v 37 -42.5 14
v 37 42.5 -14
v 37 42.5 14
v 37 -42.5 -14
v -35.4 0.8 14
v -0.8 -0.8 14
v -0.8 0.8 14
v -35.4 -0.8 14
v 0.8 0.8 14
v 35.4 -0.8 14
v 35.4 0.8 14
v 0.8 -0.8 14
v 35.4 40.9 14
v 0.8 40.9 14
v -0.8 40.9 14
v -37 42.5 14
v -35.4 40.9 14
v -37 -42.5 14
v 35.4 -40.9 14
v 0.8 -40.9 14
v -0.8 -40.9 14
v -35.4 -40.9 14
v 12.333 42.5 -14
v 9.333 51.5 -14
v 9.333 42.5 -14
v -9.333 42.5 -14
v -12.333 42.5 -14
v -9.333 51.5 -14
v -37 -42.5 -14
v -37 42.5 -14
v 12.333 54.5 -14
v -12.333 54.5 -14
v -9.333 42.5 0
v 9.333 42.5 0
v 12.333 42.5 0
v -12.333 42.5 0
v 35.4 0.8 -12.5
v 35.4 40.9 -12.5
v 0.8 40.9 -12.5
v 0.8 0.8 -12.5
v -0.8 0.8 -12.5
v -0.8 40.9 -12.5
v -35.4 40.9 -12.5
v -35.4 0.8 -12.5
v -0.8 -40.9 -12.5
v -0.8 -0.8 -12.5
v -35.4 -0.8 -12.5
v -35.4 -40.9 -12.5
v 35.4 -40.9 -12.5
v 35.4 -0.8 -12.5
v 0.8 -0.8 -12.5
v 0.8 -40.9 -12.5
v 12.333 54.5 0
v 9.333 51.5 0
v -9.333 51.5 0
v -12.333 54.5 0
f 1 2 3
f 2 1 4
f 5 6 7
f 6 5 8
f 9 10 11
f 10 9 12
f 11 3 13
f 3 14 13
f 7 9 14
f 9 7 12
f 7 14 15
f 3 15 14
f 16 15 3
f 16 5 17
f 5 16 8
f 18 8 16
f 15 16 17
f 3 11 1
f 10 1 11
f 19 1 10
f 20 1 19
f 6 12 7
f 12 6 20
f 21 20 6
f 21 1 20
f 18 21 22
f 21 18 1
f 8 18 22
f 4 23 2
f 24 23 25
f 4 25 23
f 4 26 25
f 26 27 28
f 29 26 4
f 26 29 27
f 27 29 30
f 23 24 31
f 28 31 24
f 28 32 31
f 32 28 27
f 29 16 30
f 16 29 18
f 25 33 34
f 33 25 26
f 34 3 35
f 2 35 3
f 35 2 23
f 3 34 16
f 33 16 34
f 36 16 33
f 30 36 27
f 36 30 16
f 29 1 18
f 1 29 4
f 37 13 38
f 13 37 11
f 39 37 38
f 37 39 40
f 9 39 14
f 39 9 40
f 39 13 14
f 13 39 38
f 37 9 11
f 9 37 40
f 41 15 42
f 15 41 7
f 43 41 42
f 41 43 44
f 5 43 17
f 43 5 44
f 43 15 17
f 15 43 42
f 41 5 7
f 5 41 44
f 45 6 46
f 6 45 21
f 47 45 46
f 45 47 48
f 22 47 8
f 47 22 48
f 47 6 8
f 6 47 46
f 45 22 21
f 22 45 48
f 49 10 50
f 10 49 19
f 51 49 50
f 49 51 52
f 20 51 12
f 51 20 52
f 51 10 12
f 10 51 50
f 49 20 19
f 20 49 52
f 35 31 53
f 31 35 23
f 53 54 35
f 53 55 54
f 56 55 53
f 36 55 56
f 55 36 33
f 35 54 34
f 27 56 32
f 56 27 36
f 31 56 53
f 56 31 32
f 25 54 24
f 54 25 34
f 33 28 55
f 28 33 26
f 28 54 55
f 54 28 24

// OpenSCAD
//---------------------------------------------------------------
//-- Another compartment box, by Obijuan  (Juan Gonzalez-Gomez)
//-- (c) April, 2013
//---------------------------------------------------------------
//-- Released under the GPL license
//---------------------------------------------------------------
//-- It is a design derived from:
//--   http://www.thingiverse.com/thing:15802  by ttsalo
//---------------------------------------------------------------

X = 0;
Y = 1;
Z = 2;

//-- Drawer parameters
drawer_size = [74, 85, 28];
drawer_bottom_th = 1.5;
drawer_wall_th = 1.6;

//-- Cabinet parameters -------------------------------

//-- Rhombus parameters
alpha = 60;    //-- Rhombus Side angle
rx = 8;        //-- Rhombus x length

cab_size = [79, 100, 65];
cab_th = 2;


//-- Handle parameters
handle_size = [drawer_size[X]/3, 12, drawer_size[Z]/2];
handle_th = 3;

//---------------------------------
//-- A rhombus
//---------------------------------
module rhombus(ang=60, rx=20, h=3)
{

  x = rx/2;
  y = x*tan(ang);

  translate([0, 0, -h/2])
  linear_extrude(height=h)
  polygon([[-x,0], [0,y], [x,0], [0, -y]]);
}

//--------------------------------------
//-- A mosaic of rhombus
//-- INPUTS:
//--   L = x length of the area
//--   H = y length of the area
//--   rx: rhombus x length
//--   alpha: rhombus side angle
//--   rth: rhombus thickness
//--------------------------------------
module mosaic(L, H, rx, alpha, rth)
{

  //-- x distance between two adjacent rhombuses
  l = rx+6;

  //-- y distance between two rows of rhombuses
  h = l/2 * tan(alpha);

  //-- Calculate the number of rhombuses along the x and y axis
  nrx = round((L-l/2)/l);
  nry = round((H-h)/h);

  //-- Calculate the dimension of the mosaic, according to the
  //-- number of rhombuses (columns and rows)
  H2 = h * (nry-1);
  L2 = (nrx-1) * l + rx;

  //-- Draw the mosaic
  color("green")
  translate([-L2/2 + rx/2, -H2/2, 0])  //-- center the mosaic
  for (j=[0:nry-1]) {  //-- Rows...

    for (i=[0:nrx-1-(j%2)]) {  //-- Columns
      translate([i*l + (j%2)*l/2 ,j*h,0])
        rhombus(alpha,rx, rth);
    }
  }
}

module cabinet()
{
  inner = [cab_size[X] - 2*cab_th, cab_size[Y], cab_size[Z] - 2*cab_th];

  //-- rotation, for making it printable
  rotate([90,0,0])
  union() {
  difference() {

    //-- Main cabinet
    cube(cab_size, center= true);

    //-- Inner room
    translate([0, cab_th, 0])
    cube(inner, center=true);

    //-- Top and bottom mosaics
    mosaic(L = cab_size[X], 
           H = cab_size[Y], 
           rx = rx, 
           alpha = alpha, 
           rth = cab_size[Z]+10);

     //-- Left and right mosaics
     rotate([0, 90, 0])
       mosaic(L = cab_size[Z], 
              H = cab_size[Y], 
              rx = rx, 
              alpha = alpha, 
              rth = cab_size[X] + 10);

     //-- Rear cutout
     translate([0, -cab_size[Y]/2, 0])
       cube([cab_size[X]-30, 10, cab_size[Z]-30], center=true);
  }

  //-- side rails
  translate([10/2 - cab_size[X]/2, 0, 0])
    cube([10, cab_size[Y], cab_th], center=true);

  translate([-10/2 + cab_size[X]/2, 0, 0])
    cube([10, cab_size[Y], cab_th], center=true);
  }
}



module handle()
{
  extra = 2;
  handle_co_size = [handle_size[X]-2*handle_th, handle_size[Y], handle_size[Z] + extra ];

   translate([0, handle_size[Y]/2 + drawer_size[Y]/2 , -handle_size[Z]/2]) 
    difference() {
      cube(handle_size, center=true);
      translate([0, -handle_th, 0])
        cube(handle_co_size, center=true);
    }
}

module drawer_4x4()
{
  comp_4x4_size = [drawer_size[X]/2 - drawer_wall_th - drawer_wall_th/2,
                   drawer_size[Y]/2 - drawer_wall_th - drawer_wall_th/2,
                   drawer_size[Z] ];

  xc = drawer_wall_th/2 + comp_4x4_size[X]/2;
  yc = drawer_wall_th/2 + comp_4x4_size[Y]/2;

  difference() {
    cube(drawer_size, center = true);   

    translate([xc, yc, drawer_bottom_th])
      cube(comp_4x4_size, center=true);
    
    translate([-xc, yc, drawer_bottom_th])
      cube(comp_4x4_size, center=true);
    
    translate([-xc, -yc, drawer_bottom_th])
      cube(comp_4x4_size, center=true);  
    
    translate([xc, -yc, drawer_bottom_th])
      cube(comp_4x4_size, center=true);
  }

  handle();

}

module drawer_2x1()
{
  comp_2x1_size = [drawer_size[X]/2 - drawer_wall_th - drawer_wall_th/2,
                   drawer_size[Y] - 2*drawer_wall_th,
                   drawer_size[Z] ];

  xc = drawer_wall_th/2 + comp_2x1_size[X]/2;

  difference() {
    cube(drawer_size, center = true);   

    translate([xc, 0, drawer_bottom_th])
      cube(comp_2x1_size, center=true);
    
    translate([-xc, 0, drawer_bottom_th])
      cube(comp_2x1_size, center=true);
    
  }

  handle();
}

module drawer_1x1()
{
  comp_1x1_size = [drawer_size[X] - 2*drawer_wall_th,
                   drawer_size[Y] - 2*drawer_wall_th,
                   drawer_size[Z] ];

  difference() {
    cube(drawer_size, center = true);   

    translate([0, 0, drawer_bottom_th])
      cube(comp_1x1_size, center=true);
    
  }

  handle();
}

//-- Uncomment the part you want to generate

drawer_4x4();
//drawer_2x1();
//drawer_1x1();

//cabinet();
